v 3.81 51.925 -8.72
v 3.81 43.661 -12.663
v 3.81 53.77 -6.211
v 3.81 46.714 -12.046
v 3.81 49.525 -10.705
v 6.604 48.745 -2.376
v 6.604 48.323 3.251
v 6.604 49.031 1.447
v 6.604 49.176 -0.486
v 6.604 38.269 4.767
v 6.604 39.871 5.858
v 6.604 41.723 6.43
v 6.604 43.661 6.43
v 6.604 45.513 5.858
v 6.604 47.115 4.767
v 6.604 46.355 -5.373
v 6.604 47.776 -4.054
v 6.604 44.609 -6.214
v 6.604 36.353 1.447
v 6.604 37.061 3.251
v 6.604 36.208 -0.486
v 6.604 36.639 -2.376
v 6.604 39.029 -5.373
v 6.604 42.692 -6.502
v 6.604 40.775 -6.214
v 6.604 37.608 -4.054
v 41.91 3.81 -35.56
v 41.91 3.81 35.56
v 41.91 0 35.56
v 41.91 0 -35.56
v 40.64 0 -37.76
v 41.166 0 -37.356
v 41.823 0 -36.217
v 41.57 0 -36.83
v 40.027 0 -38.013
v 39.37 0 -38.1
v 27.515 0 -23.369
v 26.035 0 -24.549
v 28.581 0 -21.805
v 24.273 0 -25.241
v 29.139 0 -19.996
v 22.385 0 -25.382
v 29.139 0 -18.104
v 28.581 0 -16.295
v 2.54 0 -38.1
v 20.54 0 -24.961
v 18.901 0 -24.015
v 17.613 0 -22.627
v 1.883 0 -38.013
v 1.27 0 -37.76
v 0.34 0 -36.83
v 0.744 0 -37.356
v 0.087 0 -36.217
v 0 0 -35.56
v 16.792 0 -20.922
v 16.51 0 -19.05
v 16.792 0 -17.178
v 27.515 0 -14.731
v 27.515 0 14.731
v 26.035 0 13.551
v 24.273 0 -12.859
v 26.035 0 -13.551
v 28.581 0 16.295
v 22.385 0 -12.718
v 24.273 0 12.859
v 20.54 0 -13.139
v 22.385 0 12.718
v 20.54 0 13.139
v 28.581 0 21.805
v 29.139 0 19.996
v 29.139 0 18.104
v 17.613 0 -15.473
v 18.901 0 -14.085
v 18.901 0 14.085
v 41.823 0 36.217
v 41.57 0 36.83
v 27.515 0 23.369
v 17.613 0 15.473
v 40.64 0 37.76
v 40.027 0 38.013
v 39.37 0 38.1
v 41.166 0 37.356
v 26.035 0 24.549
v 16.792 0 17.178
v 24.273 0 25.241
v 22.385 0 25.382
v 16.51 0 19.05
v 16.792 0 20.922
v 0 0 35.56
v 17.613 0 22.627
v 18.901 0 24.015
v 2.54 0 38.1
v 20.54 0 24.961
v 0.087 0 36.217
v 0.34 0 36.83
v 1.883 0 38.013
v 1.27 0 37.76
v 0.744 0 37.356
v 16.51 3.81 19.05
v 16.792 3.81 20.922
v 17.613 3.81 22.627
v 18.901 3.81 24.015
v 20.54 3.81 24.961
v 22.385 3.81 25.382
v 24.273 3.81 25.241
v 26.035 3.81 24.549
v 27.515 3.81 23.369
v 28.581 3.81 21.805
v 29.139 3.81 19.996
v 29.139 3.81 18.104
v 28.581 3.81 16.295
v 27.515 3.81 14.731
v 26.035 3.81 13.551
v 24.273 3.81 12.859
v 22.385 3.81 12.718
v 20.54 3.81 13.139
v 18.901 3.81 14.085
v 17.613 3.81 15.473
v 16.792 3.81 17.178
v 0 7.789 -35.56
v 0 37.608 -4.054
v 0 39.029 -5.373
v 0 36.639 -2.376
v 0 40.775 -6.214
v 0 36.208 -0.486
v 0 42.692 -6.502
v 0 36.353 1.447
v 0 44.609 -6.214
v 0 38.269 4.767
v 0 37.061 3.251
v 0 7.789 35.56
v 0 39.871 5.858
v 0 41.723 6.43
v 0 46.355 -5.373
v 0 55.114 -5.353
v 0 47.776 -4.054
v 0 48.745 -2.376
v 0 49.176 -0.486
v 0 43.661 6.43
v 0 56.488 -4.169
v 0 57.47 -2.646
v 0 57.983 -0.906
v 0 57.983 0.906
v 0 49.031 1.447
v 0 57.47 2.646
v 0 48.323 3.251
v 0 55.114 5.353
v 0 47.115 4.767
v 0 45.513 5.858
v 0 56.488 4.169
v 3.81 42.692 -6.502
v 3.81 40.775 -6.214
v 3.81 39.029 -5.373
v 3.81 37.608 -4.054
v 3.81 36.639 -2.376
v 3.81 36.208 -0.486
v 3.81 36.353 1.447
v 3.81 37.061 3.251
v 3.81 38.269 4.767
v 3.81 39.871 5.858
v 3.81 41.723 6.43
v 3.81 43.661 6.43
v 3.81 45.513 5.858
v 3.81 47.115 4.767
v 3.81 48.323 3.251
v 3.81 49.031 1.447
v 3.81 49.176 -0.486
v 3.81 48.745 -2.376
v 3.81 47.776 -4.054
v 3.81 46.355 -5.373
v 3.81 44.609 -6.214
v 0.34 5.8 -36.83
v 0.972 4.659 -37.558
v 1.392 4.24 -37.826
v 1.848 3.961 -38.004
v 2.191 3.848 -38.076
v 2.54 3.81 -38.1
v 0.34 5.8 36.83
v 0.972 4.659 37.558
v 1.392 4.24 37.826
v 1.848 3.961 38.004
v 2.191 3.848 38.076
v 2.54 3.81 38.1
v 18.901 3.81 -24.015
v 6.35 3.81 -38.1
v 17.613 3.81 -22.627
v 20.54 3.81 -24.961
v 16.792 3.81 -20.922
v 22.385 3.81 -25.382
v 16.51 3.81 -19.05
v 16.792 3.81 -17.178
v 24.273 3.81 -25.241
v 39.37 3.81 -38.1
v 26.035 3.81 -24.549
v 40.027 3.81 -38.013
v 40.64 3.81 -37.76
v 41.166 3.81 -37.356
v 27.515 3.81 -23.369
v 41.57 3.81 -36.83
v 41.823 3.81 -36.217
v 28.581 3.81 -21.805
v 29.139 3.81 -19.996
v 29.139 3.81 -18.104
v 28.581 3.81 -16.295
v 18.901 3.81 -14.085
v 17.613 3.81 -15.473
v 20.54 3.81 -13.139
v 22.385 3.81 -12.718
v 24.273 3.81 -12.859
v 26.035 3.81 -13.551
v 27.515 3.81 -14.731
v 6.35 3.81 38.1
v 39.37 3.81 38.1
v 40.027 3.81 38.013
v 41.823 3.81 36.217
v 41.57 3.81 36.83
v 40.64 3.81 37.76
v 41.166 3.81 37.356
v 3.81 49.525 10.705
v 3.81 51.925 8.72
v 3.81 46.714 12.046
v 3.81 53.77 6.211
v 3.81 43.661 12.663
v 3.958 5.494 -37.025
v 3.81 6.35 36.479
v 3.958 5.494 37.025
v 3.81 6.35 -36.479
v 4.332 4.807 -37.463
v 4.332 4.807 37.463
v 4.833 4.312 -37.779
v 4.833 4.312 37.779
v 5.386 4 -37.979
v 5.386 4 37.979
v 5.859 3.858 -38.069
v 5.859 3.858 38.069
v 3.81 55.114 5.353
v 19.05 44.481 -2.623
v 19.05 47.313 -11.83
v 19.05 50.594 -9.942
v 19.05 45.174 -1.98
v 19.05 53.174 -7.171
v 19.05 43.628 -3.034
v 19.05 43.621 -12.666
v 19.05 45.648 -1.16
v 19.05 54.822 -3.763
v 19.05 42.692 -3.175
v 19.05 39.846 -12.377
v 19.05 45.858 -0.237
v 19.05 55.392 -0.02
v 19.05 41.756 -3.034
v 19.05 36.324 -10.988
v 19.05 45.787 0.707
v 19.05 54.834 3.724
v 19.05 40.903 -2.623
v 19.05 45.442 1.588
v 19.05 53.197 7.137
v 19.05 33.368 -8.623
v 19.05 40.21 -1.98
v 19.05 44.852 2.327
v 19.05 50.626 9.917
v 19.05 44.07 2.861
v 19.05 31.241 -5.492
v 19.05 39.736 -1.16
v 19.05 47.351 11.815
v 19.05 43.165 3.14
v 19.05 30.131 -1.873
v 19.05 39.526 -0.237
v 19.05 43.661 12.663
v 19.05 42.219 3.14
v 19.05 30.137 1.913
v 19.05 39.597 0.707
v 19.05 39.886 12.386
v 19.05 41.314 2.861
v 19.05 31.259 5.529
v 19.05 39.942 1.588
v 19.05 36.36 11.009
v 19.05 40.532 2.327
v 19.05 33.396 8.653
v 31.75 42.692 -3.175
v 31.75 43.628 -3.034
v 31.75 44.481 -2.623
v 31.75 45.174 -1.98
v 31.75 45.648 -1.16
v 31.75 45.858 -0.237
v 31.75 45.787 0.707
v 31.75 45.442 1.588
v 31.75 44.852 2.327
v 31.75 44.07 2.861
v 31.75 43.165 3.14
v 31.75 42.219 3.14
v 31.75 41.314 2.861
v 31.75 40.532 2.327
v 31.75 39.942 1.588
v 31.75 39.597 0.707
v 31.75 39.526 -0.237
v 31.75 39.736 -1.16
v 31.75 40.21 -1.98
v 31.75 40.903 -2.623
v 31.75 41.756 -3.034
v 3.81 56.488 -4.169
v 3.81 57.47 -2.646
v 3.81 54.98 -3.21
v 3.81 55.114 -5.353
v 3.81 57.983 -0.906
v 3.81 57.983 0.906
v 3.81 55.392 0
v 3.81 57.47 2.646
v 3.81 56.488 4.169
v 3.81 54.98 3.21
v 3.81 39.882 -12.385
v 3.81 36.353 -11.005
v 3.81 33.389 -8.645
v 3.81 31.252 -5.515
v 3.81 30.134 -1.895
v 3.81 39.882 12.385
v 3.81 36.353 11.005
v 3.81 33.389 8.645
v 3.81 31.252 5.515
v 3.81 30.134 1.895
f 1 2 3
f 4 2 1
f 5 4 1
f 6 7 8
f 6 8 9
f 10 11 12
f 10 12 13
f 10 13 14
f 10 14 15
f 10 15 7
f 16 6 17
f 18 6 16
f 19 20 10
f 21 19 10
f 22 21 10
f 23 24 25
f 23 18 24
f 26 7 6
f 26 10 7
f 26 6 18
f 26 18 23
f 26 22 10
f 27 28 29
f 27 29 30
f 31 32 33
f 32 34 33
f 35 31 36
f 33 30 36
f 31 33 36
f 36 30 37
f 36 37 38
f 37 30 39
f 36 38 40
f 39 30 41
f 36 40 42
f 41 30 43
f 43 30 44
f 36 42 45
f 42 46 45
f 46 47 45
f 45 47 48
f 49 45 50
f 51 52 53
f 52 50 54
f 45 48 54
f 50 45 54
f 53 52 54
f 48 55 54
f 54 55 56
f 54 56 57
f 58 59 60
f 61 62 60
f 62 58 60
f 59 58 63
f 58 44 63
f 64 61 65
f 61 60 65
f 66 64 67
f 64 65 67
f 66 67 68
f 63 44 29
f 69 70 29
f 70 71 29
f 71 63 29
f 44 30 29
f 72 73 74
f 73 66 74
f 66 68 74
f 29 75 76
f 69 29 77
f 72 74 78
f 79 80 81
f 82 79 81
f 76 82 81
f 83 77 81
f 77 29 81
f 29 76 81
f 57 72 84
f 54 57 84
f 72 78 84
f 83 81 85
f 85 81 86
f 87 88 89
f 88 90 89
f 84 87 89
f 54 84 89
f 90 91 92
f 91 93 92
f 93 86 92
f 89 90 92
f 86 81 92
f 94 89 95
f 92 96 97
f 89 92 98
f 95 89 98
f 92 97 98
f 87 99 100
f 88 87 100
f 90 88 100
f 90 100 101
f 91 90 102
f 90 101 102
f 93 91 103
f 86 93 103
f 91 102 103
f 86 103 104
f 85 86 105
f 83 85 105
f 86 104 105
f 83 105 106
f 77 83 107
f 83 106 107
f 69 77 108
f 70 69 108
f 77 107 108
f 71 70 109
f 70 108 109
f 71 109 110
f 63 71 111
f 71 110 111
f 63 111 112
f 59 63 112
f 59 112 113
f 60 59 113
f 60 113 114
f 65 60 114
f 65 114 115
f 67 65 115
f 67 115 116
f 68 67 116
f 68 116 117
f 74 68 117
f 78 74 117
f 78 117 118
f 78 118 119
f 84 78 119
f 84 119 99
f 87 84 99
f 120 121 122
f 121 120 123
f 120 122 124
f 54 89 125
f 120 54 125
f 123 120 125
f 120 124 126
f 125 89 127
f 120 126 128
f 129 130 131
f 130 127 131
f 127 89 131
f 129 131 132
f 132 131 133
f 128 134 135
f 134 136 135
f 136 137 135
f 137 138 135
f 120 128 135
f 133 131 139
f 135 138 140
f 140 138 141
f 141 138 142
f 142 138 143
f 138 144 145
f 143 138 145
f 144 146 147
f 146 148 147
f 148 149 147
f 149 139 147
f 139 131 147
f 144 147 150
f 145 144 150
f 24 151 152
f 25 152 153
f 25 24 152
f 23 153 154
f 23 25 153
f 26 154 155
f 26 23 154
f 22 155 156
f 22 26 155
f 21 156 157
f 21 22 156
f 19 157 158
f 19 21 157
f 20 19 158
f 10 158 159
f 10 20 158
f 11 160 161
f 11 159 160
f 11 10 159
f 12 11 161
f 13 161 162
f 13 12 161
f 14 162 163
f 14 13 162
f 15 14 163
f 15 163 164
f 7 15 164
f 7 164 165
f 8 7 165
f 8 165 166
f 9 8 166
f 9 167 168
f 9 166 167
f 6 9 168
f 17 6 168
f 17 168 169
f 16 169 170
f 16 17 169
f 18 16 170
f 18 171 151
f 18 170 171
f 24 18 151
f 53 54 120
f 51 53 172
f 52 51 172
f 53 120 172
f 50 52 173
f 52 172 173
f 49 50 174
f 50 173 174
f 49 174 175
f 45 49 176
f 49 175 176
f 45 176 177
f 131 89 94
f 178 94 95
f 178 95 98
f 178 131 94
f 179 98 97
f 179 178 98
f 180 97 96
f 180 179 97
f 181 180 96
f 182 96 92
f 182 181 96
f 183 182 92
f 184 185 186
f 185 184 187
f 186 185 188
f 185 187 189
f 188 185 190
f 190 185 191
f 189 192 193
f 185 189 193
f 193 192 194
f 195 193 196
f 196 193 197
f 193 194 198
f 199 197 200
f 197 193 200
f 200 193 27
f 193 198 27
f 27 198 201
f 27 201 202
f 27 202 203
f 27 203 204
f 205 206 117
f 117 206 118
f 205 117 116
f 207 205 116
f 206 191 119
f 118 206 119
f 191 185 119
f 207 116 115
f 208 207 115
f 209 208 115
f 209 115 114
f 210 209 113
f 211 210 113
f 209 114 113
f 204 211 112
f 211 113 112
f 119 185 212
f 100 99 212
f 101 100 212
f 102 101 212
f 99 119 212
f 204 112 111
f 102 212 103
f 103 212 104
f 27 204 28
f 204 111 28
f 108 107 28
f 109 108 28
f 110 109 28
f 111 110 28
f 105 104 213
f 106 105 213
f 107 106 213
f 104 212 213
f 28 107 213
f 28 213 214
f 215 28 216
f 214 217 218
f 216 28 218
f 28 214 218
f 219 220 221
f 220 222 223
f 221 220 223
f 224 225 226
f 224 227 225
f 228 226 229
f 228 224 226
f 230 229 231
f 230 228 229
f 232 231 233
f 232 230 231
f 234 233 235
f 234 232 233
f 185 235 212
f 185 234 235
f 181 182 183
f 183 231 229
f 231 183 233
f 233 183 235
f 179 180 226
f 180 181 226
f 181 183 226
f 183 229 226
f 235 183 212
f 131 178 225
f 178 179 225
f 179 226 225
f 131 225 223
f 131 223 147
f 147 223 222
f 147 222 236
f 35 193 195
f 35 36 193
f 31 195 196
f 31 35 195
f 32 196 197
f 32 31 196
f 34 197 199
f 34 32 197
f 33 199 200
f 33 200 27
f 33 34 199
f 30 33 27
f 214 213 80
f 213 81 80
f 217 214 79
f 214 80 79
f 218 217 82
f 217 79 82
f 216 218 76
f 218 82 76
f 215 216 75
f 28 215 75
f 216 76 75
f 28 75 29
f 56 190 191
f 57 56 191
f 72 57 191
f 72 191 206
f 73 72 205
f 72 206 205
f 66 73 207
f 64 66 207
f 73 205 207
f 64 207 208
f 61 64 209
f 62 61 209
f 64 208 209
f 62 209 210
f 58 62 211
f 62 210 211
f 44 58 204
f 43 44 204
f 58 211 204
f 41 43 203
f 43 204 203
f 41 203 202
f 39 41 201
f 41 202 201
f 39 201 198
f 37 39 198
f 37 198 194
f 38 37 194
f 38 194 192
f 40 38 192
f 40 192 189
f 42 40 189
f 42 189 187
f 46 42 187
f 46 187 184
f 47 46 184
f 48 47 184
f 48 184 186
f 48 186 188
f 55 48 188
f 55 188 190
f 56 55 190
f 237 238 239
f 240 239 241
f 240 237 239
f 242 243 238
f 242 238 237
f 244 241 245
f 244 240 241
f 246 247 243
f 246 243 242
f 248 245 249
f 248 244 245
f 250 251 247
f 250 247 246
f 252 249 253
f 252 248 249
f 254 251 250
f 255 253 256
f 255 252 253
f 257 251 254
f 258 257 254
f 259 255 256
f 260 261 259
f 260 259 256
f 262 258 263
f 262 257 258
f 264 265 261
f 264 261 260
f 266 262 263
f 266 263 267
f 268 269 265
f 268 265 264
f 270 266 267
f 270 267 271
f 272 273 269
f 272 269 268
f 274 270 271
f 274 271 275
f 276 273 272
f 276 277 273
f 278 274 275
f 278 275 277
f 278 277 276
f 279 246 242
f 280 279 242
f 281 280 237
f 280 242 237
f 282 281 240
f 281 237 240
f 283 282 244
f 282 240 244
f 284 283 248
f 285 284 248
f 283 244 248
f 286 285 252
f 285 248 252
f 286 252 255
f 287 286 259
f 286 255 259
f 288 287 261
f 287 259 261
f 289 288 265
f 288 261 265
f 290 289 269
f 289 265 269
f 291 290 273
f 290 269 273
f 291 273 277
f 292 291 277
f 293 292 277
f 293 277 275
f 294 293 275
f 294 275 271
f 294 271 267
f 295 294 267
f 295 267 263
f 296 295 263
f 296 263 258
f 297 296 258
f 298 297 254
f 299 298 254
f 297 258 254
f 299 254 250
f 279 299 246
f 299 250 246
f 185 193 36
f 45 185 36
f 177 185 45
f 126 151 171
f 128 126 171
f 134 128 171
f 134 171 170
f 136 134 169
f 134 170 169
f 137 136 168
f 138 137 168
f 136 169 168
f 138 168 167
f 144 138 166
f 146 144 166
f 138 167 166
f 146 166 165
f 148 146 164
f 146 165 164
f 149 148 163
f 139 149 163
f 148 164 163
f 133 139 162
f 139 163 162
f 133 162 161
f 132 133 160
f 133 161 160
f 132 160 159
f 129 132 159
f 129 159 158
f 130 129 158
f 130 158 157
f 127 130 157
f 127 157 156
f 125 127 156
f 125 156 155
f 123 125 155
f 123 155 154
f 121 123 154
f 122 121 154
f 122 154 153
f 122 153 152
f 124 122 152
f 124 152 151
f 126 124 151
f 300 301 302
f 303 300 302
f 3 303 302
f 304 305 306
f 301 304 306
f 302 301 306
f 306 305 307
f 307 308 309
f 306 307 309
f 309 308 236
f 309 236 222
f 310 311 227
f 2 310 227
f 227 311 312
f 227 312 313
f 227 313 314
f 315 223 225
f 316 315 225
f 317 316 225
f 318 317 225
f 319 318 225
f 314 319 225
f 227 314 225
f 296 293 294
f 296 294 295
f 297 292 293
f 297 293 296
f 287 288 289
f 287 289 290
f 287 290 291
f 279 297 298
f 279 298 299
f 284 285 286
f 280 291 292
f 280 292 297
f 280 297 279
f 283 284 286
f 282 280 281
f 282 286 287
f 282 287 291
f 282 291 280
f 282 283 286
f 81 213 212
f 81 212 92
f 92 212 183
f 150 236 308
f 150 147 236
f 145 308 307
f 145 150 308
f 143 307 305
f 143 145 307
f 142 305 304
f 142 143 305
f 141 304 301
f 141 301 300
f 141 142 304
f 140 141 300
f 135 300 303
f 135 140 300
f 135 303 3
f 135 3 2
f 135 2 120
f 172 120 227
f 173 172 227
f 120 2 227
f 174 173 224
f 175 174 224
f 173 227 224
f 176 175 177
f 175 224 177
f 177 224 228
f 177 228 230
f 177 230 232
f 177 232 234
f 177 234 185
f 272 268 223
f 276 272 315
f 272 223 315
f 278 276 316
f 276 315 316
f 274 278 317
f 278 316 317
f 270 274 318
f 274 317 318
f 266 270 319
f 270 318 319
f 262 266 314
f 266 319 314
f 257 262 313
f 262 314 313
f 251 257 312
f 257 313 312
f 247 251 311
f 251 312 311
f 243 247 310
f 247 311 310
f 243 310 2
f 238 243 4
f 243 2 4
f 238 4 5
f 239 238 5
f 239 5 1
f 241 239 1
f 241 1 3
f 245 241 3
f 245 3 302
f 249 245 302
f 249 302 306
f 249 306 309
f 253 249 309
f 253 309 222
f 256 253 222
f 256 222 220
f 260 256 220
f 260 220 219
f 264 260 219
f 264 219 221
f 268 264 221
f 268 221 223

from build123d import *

# Parameters (mm, degrees)
BOSS_EXTRUDE1_DEPTH = 38.1
CUT_EXTRUDE2_DEPTH  = 76.2
FILLET1_R           = 6.35
SKETCH10_W          = 21.59
SKETCH10_H          = 76.2
CUT_EXTRUDE3_DEPTH  = 76.2
FILLET2_R           = 2.54
FILLET3_R           = 2.54
SKETCH11_R          = 6.5024
CUT_EXTRUDE4_DEPTH  = 76.2
SKETCH12_R          = 6.35
CUT_EXTRUDE5_DEPTH  = 76.2
SKETCH13_R          = 12.7
BOSS_EXTRUDE2_DEPTH = 15.24
CUT_EXTRUDE6_START  = -6.604
SKETCH17_R          = 6.5024
CUT_EXTRUDE6_DEPTH  = 6.604
SKETCH18_R          = 3.175
BOSS_EXTRUDE3_DEPTH = 12.7


with BuildPart() as part:
    # Sketch7 → Boss-Extrude1 (new, symmetric)
    with BuildSketch(Plane.XY):
        Polygon((0, 0), (0, 63.5), (3.81, 63.5), (3.81, 3.81), (63.5, 3.81), (63.5, 0), align=None)
    extrude(amount=BOSS_EXTRUDE1_DEPTH, both=True)

    # Sketch8 → Cut-Extrude2 (cut)
    with BuildSketch(Plane(origin=(3.81, 0, 0), x_dir=(0, 0, -1), z_dir=(1, 0, 0))):
        Polygon((-38.1, 63.5), (-38.1, 3.81), (0, 63.5), align=None)
        Polygon((38.1, 63.5), (0, 63.5), (38.1, 3.81), align=None)
    extrude(amount=-CUT_EXTRUDE2_DEPTH, mode=Mode.SUBTRACT)

    # Fillet1
    fillet1_edges = [part.edges().sort_by_distance(p)[0] for p in [
        (1.905, 63.5, 0),
    ]]
    fillet(fillet1_edges, radius=FILLET1_R)

    # Sketch10 → Cut-Extrude3 (cut)
    with BuildSketch(Plane(origin=(0, 3.81, 0), x_dir=(1, 0, 0), z_dir=(0, 1, 0))):
        with Locations((52.705, 0)):
            Rectangle(SKETCH10_W, SKETCH10_H)
    extrude(amount=-CUT_EXTRUDE3_DEPTH, mode=Mode.SUBTRACT)

    # Fillet2
    fillet2_edges = [part.edges().sort_by_distance(p)[0] for p in [
        (0, 1.905, 38.1),
        (0, 1.905, -38.1),
        (41.91, 1.905, -38.1),
        (41.91, 1.905, 38.1),
    ]]
    fillet(fillet2_edges, radius=FILLET2_R)

    # Fillet3
    fillet3_edges = [part.edges().sort_by_distance(p)[0] for p in [
        (3.81, 3.81, 0),
    ]]
    fillet(fillet3_edges, radius=FILLET3_R)

    # Sketch11 → Cut-Extrude4 (cut)
    with BuildSketch(Plane(origin=(3.81, 0, 0), x_dir=(0, 0, -1), z_dir=(1, 0, 0))):
        with Locations((0, 42.692021475)):
            Circle(SKETCH11_R)
    extrude(amount=-CUT_EXTRUDE4_DEPTH, mode=Mode.SUBTRACT)

    # Sketch12 → Cut-Extrude5 (cut)
    with BuildSketch(Plane(origin=(0, 3.81, 0), x_dir=(1, 0, 0), z_dir=(0, 1, 0))):
        with Locations(Location((22.86, 19.05, 0), (0, 0, 180))):
            Circle(SKETCH12_R)
        with Locations(Location((22.86, -19.05, 0), (0, 0, 180))):
            Circle(SKETCH12_R)
    extrude(amount=-CUT_EXTRUDE5_DEPTH, mode=Mode.SUBTRACT)

    # Sketch13 → Boss-Extrude2 (add)
    with BuildSketch(Plane(origin=(3.81, 0, 0), x_dir=(0, 0, -1), z_dir=(1, 0, 0))):
        with Locations(Location((0, 42.692021475, 0), (0, 0, 175.622523878))):
            Circle(SKETCH13_R)
    extrude(amount=BOSS_EXTRUDE2_DEPTH)

    # Sketch17 → Cut-Extrude6 (cut)
    with BuildSketch(Plane.ZY.offset(CUT_EXTRUDE6_START)):
        with Locations(Location((0, 42.692021475, 0), (0, 0, 180))):
            Circle(SKETCH17_R)
    extrude(amount=CUT_EXTRUDE6_DEPTH, mode=Mode.SUBTRACT)

    # Sketch18 → Boss-Extrude3 (add)
    with BuildSketch(Plane(origin=(19.05, 0, 0), x_dir=(0, 0, -1), z_dir=(1, 0, 0))):
        with Locations((0, 42.692021475)):
            Circle(SKETCH18_R)
    extrude(amount=BOSS_EXTRUDE3_DEPTH)


solid = part.part
